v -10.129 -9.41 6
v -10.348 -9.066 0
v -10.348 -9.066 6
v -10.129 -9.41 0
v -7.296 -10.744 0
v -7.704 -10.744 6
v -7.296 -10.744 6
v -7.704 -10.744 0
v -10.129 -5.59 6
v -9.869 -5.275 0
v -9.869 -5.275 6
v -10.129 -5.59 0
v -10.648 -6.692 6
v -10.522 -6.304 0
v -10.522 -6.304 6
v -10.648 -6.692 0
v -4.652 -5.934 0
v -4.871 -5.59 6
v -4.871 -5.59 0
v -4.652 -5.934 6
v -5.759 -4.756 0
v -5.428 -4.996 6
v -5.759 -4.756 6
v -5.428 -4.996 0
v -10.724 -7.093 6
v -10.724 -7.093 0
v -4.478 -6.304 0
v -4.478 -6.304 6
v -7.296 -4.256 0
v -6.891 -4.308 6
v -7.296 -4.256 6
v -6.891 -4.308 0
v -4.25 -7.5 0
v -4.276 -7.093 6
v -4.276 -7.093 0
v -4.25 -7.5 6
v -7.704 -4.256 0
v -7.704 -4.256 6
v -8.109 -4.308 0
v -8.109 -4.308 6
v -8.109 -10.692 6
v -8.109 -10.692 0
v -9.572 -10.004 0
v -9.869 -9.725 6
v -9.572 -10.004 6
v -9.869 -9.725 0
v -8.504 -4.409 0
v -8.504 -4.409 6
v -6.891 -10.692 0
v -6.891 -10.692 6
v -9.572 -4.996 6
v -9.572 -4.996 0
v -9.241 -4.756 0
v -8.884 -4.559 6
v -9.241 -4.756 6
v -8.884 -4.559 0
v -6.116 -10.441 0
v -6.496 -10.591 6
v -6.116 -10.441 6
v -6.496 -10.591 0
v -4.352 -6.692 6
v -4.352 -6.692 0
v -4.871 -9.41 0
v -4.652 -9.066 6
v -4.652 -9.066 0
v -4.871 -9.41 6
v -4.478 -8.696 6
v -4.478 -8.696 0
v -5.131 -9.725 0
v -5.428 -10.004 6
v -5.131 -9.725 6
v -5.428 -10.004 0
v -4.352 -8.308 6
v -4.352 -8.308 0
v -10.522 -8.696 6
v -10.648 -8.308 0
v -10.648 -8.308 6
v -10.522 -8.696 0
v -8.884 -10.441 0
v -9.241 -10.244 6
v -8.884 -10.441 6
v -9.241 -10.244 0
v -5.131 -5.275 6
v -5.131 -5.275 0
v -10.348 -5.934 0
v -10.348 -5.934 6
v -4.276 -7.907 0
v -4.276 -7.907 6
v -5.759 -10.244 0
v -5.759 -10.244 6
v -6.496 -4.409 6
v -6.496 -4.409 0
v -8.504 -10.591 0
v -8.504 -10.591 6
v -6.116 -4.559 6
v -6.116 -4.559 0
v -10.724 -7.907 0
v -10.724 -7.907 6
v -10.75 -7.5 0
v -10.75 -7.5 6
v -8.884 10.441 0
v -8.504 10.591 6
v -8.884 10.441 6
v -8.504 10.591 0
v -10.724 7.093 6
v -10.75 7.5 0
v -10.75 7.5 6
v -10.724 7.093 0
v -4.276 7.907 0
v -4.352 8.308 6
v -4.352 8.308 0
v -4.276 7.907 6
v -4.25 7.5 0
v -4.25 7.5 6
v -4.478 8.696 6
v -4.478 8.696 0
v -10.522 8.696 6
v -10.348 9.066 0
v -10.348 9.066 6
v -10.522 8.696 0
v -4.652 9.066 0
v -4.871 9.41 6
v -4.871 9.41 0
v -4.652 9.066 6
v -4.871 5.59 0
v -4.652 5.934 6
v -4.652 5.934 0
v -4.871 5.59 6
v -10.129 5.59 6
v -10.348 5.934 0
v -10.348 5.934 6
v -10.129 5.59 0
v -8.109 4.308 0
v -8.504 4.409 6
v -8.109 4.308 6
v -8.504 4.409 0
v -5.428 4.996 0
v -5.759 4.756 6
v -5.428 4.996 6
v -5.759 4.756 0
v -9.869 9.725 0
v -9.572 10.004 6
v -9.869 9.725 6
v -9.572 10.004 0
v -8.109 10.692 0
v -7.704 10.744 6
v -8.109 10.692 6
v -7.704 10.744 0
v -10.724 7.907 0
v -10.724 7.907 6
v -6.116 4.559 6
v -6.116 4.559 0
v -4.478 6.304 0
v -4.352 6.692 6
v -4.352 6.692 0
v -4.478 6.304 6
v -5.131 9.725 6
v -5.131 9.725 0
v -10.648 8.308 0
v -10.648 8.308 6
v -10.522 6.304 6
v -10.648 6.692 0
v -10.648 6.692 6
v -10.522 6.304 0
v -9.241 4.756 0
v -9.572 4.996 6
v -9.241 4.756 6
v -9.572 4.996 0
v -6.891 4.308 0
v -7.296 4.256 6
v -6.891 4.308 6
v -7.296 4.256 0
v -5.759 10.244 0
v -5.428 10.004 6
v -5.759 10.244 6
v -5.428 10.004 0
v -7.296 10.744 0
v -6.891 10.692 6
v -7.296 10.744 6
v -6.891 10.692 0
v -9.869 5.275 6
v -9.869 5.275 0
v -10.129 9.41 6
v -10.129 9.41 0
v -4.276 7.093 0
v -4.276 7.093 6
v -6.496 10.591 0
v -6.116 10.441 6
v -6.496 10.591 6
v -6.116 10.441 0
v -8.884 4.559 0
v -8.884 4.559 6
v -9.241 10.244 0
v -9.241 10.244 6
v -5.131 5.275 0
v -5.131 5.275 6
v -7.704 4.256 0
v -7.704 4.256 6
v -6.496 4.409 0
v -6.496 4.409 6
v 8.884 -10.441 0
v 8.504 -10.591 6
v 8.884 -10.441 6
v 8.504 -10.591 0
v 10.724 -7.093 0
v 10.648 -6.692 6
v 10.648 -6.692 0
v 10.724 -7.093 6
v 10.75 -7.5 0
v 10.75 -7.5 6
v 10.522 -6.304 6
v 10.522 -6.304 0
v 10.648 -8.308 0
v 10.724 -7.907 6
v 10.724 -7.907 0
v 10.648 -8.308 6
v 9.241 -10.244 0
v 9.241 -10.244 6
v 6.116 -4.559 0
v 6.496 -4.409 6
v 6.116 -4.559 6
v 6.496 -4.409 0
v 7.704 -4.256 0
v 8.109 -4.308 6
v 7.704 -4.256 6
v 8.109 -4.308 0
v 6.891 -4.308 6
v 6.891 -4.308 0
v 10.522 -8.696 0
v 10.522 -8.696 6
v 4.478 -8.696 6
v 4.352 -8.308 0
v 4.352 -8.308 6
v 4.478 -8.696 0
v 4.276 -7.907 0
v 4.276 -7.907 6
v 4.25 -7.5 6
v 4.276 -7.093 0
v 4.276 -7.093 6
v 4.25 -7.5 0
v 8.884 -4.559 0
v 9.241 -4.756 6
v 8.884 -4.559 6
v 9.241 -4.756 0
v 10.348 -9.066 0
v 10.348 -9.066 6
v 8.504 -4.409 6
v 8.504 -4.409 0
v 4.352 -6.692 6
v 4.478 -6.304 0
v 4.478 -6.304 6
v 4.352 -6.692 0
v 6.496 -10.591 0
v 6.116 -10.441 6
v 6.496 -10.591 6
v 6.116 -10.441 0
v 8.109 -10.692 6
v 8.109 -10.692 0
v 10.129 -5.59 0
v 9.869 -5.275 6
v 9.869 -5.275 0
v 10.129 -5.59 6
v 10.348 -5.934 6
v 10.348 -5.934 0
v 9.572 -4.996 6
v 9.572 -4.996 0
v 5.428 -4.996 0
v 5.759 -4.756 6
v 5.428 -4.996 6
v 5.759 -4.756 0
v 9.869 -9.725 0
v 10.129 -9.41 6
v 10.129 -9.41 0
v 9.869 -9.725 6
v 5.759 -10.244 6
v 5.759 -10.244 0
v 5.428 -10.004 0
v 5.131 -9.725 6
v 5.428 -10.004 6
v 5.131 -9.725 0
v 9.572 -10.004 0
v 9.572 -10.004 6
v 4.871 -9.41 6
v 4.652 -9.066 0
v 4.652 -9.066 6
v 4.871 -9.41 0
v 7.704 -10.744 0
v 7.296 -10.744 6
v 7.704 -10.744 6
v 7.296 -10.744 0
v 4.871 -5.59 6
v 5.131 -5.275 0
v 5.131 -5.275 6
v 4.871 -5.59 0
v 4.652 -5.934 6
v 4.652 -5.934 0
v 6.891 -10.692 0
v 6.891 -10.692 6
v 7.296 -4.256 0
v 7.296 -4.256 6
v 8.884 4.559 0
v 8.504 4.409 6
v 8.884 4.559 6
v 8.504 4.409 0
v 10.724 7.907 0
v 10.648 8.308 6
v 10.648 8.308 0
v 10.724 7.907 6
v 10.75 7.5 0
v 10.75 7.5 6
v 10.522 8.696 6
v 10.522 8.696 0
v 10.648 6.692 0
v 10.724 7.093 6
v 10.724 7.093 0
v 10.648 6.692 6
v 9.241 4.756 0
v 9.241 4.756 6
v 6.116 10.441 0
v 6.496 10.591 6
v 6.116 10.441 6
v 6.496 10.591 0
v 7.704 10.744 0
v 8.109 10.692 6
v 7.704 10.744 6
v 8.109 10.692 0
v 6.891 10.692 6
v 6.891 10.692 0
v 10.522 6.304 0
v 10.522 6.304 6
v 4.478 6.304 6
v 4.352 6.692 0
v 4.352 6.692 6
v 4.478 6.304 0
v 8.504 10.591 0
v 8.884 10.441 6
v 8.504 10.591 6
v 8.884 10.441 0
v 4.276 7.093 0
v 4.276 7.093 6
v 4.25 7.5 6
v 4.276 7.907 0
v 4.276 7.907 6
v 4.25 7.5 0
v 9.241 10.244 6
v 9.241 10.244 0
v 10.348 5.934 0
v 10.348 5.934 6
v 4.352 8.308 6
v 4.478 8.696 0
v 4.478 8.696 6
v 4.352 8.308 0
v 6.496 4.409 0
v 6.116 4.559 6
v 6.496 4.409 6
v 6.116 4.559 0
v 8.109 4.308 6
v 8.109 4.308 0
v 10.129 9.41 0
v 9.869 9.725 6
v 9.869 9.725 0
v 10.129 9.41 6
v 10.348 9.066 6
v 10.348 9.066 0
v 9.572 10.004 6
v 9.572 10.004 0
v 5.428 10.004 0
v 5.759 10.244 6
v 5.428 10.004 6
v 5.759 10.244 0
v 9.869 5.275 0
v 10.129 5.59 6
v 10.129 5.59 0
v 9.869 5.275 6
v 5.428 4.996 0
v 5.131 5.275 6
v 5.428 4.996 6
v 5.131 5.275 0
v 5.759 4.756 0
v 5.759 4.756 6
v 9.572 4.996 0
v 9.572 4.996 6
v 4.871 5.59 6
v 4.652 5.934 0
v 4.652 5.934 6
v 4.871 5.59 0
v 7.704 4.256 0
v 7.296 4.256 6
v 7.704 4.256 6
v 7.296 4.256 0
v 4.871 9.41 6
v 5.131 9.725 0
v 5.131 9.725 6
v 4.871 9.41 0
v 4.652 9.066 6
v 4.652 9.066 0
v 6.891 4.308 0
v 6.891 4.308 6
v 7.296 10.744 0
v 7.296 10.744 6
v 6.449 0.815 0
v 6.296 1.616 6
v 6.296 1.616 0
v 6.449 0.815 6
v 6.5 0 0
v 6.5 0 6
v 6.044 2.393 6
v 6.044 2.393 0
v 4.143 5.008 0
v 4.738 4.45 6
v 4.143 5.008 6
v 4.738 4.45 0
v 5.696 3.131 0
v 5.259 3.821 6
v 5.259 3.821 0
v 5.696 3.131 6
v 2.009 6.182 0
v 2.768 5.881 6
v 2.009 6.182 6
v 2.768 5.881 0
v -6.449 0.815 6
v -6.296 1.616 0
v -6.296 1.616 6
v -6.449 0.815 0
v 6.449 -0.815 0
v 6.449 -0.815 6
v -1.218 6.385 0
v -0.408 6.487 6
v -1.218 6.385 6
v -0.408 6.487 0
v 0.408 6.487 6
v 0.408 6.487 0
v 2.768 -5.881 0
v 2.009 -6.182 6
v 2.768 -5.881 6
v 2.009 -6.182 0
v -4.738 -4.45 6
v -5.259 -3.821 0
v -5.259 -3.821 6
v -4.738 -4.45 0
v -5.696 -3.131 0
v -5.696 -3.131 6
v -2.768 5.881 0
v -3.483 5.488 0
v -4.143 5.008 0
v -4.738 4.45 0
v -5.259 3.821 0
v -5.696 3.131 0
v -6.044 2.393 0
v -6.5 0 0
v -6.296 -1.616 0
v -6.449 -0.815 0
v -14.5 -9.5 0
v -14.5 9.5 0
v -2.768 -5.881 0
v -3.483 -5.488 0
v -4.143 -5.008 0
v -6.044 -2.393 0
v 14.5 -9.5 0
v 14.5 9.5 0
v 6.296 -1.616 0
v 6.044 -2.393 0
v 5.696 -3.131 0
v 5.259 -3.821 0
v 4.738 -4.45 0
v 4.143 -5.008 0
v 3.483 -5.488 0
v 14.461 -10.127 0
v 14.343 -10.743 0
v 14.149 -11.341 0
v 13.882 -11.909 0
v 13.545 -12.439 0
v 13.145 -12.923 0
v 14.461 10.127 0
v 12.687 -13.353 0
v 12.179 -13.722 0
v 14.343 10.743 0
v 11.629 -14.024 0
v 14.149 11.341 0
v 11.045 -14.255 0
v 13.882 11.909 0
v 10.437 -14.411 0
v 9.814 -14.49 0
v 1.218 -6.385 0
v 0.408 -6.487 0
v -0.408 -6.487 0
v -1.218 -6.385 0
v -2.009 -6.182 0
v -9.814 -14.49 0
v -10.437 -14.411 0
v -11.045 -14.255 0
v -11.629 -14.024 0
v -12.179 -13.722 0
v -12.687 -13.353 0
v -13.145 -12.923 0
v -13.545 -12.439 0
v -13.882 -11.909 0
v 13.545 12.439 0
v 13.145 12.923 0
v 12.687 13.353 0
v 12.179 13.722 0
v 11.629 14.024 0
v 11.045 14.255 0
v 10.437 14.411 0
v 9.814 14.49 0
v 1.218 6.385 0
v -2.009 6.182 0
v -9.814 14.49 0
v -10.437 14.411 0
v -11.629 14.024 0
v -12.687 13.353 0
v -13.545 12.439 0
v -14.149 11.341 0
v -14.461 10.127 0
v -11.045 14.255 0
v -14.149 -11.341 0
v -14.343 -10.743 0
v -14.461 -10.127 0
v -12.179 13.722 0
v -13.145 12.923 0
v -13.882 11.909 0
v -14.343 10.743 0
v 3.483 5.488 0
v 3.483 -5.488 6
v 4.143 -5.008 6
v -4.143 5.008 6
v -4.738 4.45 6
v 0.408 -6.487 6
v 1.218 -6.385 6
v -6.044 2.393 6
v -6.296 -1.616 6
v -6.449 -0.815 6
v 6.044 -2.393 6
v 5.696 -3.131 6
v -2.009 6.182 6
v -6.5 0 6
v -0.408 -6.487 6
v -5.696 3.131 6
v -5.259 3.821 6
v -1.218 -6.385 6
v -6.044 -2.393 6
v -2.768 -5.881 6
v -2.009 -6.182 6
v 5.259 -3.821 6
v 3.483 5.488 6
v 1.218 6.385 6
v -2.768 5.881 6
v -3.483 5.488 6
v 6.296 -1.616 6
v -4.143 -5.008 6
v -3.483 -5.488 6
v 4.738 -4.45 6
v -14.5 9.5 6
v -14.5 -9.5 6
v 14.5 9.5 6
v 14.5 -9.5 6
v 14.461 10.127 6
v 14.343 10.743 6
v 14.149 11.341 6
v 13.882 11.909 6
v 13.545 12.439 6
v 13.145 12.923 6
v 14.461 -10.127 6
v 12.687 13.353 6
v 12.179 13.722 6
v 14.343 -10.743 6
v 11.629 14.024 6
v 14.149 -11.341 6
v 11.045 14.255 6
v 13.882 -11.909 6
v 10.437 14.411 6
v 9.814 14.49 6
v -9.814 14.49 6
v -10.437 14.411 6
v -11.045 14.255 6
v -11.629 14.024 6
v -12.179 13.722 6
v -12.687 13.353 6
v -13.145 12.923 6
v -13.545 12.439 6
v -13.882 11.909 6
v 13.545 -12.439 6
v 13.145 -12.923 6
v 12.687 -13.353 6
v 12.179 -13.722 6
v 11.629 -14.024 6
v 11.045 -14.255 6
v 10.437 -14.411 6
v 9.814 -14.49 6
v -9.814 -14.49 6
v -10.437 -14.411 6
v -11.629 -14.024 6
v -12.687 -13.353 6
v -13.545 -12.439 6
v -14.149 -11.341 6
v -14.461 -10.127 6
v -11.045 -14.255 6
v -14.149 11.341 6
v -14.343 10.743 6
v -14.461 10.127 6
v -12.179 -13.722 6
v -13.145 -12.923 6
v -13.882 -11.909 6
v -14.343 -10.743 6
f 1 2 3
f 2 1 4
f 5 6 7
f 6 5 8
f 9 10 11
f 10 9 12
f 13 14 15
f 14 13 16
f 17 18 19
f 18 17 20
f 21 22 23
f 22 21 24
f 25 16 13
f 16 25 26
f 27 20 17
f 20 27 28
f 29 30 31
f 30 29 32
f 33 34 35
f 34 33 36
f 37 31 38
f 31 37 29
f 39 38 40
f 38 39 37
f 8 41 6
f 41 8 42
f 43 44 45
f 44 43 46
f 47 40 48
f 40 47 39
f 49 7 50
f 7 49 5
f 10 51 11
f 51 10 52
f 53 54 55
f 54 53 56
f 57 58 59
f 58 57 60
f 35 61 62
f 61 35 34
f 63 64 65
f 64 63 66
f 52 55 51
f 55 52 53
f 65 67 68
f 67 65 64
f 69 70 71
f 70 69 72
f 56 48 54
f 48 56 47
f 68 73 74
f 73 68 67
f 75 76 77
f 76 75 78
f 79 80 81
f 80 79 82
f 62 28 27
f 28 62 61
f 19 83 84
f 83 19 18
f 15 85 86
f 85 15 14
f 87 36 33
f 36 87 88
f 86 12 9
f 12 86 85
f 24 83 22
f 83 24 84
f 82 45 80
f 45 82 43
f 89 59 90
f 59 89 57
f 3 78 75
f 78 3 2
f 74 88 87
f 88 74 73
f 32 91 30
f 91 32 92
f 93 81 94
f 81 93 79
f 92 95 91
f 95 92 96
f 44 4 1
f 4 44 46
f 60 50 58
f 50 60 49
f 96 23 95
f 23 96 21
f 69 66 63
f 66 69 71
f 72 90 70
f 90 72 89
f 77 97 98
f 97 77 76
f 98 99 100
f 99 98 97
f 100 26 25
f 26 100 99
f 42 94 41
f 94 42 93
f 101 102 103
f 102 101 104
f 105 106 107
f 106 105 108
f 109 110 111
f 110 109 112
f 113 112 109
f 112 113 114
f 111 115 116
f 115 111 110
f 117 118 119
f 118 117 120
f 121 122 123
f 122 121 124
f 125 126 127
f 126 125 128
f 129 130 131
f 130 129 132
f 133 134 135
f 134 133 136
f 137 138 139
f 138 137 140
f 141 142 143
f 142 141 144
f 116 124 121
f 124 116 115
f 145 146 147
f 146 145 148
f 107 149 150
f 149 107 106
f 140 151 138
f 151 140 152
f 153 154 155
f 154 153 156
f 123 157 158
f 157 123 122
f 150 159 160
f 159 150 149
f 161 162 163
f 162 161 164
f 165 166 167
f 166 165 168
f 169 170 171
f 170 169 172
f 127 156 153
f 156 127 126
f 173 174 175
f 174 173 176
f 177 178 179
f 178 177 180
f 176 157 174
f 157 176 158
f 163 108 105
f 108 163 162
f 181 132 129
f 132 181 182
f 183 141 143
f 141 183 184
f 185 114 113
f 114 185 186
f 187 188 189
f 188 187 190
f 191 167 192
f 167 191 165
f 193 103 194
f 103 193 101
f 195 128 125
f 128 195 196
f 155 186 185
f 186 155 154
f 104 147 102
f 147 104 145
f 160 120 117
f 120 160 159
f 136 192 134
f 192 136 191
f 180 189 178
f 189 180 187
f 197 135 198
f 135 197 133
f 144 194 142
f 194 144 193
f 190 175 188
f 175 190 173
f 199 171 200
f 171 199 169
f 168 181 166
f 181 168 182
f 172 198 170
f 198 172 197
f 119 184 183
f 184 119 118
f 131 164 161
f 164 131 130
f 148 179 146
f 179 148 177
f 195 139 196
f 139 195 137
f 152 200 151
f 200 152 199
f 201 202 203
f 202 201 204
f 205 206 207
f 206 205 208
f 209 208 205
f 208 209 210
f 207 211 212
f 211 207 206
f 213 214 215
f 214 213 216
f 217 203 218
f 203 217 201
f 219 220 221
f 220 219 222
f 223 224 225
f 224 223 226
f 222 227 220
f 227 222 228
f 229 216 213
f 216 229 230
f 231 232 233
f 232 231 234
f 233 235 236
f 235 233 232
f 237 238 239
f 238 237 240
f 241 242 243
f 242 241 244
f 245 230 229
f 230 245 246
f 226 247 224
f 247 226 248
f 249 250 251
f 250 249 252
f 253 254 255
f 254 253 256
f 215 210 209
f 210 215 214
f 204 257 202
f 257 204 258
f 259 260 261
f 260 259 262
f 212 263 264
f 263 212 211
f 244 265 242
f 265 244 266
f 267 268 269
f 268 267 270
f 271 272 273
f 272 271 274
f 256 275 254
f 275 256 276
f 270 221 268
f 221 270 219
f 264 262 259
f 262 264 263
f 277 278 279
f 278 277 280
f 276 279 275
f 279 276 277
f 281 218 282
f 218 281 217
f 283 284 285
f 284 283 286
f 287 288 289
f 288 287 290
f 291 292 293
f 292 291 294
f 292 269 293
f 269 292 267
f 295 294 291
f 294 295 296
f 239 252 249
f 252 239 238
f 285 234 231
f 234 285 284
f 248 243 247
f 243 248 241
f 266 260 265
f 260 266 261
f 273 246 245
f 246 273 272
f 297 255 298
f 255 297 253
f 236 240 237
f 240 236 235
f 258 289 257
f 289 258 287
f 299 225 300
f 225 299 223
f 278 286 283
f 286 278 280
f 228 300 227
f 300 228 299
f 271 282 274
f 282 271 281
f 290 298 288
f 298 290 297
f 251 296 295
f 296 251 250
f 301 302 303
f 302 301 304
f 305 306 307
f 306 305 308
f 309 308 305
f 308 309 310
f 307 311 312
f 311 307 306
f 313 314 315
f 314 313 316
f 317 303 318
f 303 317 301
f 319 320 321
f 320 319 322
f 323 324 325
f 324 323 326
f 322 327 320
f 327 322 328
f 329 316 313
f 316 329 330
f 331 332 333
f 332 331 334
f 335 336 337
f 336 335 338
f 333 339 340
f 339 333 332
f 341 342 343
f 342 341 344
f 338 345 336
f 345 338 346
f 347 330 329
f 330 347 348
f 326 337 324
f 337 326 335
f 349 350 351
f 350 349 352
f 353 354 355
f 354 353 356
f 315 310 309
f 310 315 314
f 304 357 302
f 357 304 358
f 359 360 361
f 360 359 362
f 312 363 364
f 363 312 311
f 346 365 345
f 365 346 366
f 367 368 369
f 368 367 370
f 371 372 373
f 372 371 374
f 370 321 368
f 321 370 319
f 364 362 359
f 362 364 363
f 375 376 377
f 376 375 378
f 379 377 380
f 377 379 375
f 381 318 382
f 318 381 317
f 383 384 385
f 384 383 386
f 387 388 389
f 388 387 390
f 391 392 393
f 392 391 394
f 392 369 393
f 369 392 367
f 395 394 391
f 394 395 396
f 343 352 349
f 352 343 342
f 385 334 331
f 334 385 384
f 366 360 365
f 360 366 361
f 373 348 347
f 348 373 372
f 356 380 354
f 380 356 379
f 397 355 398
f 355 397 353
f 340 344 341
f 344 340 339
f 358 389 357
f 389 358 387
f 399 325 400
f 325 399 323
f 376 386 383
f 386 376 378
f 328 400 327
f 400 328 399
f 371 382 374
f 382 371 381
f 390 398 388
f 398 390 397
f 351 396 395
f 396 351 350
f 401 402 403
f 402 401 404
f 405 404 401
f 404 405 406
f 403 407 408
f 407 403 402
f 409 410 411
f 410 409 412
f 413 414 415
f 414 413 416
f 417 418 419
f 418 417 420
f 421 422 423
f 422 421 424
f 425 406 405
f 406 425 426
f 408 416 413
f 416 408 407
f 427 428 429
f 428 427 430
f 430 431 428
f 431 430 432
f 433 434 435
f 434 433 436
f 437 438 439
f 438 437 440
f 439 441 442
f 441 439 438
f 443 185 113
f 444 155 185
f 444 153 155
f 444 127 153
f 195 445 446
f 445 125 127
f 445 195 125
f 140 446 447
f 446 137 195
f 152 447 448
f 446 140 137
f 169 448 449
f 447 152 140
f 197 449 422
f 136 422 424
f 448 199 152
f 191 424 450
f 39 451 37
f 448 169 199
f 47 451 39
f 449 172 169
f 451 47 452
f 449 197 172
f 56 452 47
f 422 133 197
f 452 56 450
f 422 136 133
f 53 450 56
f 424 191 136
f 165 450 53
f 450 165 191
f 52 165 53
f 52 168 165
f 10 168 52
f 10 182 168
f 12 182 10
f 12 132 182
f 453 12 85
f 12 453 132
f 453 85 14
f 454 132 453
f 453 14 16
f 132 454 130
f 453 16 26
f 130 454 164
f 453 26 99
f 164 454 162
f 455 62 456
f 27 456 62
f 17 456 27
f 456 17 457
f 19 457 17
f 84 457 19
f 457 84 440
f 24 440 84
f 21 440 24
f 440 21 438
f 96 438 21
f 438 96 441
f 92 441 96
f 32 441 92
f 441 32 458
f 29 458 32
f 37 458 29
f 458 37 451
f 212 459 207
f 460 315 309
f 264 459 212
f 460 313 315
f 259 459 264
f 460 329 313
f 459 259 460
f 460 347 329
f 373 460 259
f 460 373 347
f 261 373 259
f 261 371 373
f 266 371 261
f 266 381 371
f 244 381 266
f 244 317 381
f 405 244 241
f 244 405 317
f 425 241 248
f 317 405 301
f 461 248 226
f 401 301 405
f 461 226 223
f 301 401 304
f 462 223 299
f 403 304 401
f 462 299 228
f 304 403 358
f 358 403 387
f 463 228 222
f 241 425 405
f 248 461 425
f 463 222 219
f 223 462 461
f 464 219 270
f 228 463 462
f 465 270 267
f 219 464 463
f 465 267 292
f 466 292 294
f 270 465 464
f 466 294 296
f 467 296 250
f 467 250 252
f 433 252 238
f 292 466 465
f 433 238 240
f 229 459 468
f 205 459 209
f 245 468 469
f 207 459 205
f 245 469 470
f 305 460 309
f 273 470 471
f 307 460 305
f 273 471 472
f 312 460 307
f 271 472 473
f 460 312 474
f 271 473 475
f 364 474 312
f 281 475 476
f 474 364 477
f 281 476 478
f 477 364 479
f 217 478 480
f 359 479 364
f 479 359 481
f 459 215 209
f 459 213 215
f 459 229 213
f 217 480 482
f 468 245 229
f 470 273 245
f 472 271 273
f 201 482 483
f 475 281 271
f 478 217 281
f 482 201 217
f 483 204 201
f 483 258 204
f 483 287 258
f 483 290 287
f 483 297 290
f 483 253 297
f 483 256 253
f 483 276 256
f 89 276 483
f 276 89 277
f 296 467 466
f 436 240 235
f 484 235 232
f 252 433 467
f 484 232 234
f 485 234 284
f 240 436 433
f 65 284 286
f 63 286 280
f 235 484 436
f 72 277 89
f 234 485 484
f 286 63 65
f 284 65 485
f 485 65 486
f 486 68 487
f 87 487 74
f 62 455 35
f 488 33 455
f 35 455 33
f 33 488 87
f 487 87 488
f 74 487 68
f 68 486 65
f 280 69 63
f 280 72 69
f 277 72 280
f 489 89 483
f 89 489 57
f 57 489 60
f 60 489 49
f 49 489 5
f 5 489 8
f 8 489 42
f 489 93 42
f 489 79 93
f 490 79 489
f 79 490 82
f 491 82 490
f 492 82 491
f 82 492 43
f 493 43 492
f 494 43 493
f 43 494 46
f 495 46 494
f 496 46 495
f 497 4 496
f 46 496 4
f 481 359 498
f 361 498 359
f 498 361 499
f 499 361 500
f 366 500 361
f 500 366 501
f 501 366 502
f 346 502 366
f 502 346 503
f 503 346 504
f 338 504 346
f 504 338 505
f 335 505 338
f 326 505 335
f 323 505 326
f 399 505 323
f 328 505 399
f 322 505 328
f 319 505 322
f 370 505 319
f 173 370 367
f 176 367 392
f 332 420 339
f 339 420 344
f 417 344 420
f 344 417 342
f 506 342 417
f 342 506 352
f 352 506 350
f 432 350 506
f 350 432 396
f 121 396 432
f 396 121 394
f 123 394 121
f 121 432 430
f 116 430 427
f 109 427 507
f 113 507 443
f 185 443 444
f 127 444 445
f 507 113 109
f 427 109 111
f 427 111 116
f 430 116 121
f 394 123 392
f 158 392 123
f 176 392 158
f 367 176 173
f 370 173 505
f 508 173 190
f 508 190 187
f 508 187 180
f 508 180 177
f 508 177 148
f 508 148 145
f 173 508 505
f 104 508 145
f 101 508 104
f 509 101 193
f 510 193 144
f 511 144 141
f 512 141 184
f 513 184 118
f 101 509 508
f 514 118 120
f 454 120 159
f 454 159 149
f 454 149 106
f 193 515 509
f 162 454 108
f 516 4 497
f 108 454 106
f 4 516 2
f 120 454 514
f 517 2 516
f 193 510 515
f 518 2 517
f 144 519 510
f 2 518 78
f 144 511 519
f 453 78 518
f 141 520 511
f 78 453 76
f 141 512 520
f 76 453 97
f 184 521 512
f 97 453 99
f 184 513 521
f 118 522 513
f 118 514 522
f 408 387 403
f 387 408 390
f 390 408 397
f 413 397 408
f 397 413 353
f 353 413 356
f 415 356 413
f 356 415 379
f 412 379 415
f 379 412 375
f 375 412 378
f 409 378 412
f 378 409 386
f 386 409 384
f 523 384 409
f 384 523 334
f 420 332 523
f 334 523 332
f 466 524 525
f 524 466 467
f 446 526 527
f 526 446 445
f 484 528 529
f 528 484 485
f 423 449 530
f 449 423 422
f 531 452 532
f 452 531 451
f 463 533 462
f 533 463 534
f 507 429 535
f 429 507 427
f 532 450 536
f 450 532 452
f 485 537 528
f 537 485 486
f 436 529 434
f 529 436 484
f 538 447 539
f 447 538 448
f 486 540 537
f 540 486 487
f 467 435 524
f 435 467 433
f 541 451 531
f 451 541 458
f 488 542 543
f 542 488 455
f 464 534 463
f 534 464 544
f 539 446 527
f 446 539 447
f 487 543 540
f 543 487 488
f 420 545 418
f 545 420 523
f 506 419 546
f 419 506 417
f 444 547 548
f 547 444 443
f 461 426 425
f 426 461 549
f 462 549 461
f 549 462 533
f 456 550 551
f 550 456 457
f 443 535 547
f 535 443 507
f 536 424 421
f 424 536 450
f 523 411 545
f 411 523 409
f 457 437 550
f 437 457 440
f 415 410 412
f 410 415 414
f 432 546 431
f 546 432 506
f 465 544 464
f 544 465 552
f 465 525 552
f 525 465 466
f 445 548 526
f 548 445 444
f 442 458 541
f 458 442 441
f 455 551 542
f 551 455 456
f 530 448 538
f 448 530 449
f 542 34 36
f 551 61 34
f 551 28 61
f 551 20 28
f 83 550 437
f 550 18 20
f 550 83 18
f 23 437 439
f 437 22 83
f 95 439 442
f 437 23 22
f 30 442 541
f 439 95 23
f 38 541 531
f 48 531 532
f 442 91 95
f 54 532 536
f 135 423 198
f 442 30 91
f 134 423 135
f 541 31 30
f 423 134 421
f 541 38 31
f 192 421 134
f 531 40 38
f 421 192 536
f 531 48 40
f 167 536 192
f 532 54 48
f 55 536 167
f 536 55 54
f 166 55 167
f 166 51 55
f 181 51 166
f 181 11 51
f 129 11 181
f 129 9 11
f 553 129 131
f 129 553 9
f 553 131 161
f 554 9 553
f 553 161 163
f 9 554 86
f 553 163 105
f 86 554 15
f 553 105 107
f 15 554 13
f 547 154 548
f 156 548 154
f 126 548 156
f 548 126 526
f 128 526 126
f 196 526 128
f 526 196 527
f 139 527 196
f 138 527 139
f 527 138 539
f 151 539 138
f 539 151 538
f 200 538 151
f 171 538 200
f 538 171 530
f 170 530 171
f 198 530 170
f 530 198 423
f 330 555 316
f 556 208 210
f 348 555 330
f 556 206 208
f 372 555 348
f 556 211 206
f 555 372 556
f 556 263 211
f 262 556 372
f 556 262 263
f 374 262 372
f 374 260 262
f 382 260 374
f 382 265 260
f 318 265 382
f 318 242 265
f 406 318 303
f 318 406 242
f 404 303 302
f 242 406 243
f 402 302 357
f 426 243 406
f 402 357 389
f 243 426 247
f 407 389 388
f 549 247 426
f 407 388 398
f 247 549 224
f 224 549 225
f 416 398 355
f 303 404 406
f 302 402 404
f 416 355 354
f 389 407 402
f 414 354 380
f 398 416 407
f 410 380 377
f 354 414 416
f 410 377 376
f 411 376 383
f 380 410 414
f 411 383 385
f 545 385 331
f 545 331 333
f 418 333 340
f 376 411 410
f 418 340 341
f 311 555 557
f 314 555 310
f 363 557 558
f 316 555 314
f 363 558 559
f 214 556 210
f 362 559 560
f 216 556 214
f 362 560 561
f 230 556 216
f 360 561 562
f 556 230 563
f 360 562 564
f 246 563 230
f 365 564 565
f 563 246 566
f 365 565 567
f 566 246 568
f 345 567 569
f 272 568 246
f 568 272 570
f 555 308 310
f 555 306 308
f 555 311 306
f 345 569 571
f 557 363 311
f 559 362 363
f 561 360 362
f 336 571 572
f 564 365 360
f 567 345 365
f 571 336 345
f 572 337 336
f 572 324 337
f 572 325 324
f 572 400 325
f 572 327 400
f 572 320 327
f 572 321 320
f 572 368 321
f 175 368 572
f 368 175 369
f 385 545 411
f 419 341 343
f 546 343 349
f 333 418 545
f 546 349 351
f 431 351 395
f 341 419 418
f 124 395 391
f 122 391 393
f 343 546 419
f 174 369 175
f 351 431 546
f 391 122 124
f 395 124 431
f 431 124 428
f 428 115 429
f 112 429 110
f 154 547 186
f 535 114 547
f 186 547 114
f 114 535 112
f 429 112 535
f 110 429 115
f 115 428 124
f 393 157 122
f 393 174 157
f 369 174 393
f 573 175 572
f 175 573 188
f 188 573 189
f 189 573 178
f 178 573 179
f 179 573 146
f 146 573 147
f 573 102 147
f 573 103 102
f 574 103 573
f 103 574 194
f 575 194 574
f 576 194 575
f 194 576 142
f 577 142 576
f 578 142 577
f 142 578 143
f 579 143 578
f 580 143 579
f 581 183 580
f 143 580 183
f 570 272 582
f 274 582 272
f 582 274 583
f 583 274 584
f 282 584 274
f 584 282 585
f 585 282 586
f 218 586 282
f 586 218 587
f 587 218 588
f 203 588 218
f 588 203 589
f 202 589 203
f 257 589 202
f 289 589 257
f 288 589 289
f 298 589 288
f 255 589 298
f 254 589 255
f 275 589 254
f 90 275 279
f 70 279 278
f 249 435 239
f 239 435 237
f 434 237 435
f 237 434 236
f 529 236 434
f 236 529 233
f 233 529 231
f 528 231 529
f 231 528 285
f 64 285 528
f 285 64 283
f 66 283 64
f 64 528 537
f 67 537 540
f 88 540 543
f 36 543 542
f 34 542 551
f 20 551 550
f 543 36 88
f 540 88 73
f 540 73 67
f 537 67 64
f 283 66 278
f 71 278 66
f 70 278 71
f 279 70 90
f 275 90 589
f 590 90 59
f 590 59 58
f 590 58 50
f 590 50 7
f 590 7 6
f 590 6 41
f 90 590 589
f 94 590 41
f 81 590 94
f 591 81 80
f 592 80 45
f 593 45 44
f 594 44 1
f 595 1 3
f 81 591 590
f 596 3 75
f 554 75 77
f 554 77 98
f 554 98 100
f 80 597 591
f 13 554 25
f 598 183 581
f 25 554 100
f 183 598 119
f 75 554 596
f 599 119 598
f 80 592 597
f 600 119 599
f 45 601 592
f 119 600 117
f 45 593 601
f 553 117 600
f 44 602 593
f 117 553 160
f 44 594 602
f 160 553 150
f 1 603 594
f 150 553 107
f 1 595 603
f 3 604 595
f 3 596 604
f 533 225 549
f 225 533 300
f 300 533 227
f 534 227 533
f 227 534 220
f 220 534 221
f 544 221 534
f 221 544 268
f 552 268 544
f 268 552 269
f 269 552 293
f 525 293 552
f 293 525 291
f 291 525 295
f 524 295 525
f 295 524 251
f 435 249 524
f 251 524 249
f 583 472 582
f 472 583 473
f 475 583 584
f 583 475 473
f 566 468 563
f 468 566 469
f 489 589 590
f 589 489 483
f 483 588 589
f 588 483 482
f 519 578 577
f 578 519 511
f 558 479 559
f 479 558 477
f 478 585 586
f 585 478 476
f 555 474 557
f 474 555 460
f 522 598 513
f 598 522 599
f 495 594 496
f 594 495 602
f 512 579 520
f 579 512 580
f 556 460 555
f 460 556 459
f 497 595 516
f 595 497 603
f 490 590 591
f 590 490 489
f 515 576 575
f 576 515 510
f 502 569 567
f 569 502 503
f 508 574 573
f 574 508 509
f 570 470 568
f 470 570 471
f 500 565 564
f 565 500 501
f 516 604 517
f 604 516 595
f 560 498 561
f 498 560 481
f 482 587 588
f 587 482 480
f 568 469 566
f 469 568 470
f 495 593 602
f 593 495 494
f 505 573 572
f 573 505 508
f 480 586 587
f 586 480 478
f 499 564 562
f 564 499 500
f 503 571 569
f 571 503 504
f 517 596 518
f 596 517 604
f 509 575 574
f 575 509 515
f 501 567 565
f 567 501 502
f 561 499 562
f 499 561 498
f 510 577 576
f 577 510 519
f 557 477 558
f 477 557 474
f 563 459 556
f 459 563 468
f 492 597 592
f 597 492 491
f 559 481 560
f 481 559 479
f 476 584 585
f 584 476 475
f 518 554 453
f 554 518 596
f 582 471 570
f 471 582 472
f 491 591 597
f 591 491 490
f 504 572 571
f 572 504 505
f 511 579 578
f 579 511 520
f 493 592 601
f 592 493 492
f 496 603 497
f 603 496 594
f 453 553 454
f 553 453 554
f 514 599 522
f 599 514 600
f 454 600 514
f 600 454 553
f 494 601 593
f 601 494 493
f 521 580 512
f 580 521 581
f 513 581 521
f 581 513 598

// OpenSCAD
$fn = 50;


difference() {
	union() {
		hull() {
			translate(v = [-9.5000000000, 9.5000000000, 0]) {
				cylinder(h = 6, r = 5);
			}
			translate(v = [9.5000000000, 9.5000000000, 0]) {
				cylinder(h = 6, r = 5);
			}
			translate(v = [-9.5000000000, -9.5000000000, 0]) {
				cylinder(h = 6, r = 5);
			}
			translate(v = [9.5000000000, -9.5000000000, 0]) {
				cylinder(h = 6, r = 5);
			}
		}
	}
	union() {
		#translate(v = [-7.5000000000, -7.5000000000, -100.0000000000]) {
			cylinder(h = 200, r = 3.2500000000);
		}
		#translate(v = [-7.5000000000, 7.5000000000, -100.0000000000]) {
			cylinder(h = 200, r = 3.2500000000);
		}
		#translate(v = [7.5000000000, -7.5000000000, -100.0000000000]) {
			cylinder(h = 200, r = 3.2500000000);
		}
		#translate(v = [7.5000000000, 7.5000000000, -100.0000000000]) {
			cylinder(h = 200, r = 3.2500000000);
		}
		#cylinder(h = 6, r = 6.5000000000);
	}
}
